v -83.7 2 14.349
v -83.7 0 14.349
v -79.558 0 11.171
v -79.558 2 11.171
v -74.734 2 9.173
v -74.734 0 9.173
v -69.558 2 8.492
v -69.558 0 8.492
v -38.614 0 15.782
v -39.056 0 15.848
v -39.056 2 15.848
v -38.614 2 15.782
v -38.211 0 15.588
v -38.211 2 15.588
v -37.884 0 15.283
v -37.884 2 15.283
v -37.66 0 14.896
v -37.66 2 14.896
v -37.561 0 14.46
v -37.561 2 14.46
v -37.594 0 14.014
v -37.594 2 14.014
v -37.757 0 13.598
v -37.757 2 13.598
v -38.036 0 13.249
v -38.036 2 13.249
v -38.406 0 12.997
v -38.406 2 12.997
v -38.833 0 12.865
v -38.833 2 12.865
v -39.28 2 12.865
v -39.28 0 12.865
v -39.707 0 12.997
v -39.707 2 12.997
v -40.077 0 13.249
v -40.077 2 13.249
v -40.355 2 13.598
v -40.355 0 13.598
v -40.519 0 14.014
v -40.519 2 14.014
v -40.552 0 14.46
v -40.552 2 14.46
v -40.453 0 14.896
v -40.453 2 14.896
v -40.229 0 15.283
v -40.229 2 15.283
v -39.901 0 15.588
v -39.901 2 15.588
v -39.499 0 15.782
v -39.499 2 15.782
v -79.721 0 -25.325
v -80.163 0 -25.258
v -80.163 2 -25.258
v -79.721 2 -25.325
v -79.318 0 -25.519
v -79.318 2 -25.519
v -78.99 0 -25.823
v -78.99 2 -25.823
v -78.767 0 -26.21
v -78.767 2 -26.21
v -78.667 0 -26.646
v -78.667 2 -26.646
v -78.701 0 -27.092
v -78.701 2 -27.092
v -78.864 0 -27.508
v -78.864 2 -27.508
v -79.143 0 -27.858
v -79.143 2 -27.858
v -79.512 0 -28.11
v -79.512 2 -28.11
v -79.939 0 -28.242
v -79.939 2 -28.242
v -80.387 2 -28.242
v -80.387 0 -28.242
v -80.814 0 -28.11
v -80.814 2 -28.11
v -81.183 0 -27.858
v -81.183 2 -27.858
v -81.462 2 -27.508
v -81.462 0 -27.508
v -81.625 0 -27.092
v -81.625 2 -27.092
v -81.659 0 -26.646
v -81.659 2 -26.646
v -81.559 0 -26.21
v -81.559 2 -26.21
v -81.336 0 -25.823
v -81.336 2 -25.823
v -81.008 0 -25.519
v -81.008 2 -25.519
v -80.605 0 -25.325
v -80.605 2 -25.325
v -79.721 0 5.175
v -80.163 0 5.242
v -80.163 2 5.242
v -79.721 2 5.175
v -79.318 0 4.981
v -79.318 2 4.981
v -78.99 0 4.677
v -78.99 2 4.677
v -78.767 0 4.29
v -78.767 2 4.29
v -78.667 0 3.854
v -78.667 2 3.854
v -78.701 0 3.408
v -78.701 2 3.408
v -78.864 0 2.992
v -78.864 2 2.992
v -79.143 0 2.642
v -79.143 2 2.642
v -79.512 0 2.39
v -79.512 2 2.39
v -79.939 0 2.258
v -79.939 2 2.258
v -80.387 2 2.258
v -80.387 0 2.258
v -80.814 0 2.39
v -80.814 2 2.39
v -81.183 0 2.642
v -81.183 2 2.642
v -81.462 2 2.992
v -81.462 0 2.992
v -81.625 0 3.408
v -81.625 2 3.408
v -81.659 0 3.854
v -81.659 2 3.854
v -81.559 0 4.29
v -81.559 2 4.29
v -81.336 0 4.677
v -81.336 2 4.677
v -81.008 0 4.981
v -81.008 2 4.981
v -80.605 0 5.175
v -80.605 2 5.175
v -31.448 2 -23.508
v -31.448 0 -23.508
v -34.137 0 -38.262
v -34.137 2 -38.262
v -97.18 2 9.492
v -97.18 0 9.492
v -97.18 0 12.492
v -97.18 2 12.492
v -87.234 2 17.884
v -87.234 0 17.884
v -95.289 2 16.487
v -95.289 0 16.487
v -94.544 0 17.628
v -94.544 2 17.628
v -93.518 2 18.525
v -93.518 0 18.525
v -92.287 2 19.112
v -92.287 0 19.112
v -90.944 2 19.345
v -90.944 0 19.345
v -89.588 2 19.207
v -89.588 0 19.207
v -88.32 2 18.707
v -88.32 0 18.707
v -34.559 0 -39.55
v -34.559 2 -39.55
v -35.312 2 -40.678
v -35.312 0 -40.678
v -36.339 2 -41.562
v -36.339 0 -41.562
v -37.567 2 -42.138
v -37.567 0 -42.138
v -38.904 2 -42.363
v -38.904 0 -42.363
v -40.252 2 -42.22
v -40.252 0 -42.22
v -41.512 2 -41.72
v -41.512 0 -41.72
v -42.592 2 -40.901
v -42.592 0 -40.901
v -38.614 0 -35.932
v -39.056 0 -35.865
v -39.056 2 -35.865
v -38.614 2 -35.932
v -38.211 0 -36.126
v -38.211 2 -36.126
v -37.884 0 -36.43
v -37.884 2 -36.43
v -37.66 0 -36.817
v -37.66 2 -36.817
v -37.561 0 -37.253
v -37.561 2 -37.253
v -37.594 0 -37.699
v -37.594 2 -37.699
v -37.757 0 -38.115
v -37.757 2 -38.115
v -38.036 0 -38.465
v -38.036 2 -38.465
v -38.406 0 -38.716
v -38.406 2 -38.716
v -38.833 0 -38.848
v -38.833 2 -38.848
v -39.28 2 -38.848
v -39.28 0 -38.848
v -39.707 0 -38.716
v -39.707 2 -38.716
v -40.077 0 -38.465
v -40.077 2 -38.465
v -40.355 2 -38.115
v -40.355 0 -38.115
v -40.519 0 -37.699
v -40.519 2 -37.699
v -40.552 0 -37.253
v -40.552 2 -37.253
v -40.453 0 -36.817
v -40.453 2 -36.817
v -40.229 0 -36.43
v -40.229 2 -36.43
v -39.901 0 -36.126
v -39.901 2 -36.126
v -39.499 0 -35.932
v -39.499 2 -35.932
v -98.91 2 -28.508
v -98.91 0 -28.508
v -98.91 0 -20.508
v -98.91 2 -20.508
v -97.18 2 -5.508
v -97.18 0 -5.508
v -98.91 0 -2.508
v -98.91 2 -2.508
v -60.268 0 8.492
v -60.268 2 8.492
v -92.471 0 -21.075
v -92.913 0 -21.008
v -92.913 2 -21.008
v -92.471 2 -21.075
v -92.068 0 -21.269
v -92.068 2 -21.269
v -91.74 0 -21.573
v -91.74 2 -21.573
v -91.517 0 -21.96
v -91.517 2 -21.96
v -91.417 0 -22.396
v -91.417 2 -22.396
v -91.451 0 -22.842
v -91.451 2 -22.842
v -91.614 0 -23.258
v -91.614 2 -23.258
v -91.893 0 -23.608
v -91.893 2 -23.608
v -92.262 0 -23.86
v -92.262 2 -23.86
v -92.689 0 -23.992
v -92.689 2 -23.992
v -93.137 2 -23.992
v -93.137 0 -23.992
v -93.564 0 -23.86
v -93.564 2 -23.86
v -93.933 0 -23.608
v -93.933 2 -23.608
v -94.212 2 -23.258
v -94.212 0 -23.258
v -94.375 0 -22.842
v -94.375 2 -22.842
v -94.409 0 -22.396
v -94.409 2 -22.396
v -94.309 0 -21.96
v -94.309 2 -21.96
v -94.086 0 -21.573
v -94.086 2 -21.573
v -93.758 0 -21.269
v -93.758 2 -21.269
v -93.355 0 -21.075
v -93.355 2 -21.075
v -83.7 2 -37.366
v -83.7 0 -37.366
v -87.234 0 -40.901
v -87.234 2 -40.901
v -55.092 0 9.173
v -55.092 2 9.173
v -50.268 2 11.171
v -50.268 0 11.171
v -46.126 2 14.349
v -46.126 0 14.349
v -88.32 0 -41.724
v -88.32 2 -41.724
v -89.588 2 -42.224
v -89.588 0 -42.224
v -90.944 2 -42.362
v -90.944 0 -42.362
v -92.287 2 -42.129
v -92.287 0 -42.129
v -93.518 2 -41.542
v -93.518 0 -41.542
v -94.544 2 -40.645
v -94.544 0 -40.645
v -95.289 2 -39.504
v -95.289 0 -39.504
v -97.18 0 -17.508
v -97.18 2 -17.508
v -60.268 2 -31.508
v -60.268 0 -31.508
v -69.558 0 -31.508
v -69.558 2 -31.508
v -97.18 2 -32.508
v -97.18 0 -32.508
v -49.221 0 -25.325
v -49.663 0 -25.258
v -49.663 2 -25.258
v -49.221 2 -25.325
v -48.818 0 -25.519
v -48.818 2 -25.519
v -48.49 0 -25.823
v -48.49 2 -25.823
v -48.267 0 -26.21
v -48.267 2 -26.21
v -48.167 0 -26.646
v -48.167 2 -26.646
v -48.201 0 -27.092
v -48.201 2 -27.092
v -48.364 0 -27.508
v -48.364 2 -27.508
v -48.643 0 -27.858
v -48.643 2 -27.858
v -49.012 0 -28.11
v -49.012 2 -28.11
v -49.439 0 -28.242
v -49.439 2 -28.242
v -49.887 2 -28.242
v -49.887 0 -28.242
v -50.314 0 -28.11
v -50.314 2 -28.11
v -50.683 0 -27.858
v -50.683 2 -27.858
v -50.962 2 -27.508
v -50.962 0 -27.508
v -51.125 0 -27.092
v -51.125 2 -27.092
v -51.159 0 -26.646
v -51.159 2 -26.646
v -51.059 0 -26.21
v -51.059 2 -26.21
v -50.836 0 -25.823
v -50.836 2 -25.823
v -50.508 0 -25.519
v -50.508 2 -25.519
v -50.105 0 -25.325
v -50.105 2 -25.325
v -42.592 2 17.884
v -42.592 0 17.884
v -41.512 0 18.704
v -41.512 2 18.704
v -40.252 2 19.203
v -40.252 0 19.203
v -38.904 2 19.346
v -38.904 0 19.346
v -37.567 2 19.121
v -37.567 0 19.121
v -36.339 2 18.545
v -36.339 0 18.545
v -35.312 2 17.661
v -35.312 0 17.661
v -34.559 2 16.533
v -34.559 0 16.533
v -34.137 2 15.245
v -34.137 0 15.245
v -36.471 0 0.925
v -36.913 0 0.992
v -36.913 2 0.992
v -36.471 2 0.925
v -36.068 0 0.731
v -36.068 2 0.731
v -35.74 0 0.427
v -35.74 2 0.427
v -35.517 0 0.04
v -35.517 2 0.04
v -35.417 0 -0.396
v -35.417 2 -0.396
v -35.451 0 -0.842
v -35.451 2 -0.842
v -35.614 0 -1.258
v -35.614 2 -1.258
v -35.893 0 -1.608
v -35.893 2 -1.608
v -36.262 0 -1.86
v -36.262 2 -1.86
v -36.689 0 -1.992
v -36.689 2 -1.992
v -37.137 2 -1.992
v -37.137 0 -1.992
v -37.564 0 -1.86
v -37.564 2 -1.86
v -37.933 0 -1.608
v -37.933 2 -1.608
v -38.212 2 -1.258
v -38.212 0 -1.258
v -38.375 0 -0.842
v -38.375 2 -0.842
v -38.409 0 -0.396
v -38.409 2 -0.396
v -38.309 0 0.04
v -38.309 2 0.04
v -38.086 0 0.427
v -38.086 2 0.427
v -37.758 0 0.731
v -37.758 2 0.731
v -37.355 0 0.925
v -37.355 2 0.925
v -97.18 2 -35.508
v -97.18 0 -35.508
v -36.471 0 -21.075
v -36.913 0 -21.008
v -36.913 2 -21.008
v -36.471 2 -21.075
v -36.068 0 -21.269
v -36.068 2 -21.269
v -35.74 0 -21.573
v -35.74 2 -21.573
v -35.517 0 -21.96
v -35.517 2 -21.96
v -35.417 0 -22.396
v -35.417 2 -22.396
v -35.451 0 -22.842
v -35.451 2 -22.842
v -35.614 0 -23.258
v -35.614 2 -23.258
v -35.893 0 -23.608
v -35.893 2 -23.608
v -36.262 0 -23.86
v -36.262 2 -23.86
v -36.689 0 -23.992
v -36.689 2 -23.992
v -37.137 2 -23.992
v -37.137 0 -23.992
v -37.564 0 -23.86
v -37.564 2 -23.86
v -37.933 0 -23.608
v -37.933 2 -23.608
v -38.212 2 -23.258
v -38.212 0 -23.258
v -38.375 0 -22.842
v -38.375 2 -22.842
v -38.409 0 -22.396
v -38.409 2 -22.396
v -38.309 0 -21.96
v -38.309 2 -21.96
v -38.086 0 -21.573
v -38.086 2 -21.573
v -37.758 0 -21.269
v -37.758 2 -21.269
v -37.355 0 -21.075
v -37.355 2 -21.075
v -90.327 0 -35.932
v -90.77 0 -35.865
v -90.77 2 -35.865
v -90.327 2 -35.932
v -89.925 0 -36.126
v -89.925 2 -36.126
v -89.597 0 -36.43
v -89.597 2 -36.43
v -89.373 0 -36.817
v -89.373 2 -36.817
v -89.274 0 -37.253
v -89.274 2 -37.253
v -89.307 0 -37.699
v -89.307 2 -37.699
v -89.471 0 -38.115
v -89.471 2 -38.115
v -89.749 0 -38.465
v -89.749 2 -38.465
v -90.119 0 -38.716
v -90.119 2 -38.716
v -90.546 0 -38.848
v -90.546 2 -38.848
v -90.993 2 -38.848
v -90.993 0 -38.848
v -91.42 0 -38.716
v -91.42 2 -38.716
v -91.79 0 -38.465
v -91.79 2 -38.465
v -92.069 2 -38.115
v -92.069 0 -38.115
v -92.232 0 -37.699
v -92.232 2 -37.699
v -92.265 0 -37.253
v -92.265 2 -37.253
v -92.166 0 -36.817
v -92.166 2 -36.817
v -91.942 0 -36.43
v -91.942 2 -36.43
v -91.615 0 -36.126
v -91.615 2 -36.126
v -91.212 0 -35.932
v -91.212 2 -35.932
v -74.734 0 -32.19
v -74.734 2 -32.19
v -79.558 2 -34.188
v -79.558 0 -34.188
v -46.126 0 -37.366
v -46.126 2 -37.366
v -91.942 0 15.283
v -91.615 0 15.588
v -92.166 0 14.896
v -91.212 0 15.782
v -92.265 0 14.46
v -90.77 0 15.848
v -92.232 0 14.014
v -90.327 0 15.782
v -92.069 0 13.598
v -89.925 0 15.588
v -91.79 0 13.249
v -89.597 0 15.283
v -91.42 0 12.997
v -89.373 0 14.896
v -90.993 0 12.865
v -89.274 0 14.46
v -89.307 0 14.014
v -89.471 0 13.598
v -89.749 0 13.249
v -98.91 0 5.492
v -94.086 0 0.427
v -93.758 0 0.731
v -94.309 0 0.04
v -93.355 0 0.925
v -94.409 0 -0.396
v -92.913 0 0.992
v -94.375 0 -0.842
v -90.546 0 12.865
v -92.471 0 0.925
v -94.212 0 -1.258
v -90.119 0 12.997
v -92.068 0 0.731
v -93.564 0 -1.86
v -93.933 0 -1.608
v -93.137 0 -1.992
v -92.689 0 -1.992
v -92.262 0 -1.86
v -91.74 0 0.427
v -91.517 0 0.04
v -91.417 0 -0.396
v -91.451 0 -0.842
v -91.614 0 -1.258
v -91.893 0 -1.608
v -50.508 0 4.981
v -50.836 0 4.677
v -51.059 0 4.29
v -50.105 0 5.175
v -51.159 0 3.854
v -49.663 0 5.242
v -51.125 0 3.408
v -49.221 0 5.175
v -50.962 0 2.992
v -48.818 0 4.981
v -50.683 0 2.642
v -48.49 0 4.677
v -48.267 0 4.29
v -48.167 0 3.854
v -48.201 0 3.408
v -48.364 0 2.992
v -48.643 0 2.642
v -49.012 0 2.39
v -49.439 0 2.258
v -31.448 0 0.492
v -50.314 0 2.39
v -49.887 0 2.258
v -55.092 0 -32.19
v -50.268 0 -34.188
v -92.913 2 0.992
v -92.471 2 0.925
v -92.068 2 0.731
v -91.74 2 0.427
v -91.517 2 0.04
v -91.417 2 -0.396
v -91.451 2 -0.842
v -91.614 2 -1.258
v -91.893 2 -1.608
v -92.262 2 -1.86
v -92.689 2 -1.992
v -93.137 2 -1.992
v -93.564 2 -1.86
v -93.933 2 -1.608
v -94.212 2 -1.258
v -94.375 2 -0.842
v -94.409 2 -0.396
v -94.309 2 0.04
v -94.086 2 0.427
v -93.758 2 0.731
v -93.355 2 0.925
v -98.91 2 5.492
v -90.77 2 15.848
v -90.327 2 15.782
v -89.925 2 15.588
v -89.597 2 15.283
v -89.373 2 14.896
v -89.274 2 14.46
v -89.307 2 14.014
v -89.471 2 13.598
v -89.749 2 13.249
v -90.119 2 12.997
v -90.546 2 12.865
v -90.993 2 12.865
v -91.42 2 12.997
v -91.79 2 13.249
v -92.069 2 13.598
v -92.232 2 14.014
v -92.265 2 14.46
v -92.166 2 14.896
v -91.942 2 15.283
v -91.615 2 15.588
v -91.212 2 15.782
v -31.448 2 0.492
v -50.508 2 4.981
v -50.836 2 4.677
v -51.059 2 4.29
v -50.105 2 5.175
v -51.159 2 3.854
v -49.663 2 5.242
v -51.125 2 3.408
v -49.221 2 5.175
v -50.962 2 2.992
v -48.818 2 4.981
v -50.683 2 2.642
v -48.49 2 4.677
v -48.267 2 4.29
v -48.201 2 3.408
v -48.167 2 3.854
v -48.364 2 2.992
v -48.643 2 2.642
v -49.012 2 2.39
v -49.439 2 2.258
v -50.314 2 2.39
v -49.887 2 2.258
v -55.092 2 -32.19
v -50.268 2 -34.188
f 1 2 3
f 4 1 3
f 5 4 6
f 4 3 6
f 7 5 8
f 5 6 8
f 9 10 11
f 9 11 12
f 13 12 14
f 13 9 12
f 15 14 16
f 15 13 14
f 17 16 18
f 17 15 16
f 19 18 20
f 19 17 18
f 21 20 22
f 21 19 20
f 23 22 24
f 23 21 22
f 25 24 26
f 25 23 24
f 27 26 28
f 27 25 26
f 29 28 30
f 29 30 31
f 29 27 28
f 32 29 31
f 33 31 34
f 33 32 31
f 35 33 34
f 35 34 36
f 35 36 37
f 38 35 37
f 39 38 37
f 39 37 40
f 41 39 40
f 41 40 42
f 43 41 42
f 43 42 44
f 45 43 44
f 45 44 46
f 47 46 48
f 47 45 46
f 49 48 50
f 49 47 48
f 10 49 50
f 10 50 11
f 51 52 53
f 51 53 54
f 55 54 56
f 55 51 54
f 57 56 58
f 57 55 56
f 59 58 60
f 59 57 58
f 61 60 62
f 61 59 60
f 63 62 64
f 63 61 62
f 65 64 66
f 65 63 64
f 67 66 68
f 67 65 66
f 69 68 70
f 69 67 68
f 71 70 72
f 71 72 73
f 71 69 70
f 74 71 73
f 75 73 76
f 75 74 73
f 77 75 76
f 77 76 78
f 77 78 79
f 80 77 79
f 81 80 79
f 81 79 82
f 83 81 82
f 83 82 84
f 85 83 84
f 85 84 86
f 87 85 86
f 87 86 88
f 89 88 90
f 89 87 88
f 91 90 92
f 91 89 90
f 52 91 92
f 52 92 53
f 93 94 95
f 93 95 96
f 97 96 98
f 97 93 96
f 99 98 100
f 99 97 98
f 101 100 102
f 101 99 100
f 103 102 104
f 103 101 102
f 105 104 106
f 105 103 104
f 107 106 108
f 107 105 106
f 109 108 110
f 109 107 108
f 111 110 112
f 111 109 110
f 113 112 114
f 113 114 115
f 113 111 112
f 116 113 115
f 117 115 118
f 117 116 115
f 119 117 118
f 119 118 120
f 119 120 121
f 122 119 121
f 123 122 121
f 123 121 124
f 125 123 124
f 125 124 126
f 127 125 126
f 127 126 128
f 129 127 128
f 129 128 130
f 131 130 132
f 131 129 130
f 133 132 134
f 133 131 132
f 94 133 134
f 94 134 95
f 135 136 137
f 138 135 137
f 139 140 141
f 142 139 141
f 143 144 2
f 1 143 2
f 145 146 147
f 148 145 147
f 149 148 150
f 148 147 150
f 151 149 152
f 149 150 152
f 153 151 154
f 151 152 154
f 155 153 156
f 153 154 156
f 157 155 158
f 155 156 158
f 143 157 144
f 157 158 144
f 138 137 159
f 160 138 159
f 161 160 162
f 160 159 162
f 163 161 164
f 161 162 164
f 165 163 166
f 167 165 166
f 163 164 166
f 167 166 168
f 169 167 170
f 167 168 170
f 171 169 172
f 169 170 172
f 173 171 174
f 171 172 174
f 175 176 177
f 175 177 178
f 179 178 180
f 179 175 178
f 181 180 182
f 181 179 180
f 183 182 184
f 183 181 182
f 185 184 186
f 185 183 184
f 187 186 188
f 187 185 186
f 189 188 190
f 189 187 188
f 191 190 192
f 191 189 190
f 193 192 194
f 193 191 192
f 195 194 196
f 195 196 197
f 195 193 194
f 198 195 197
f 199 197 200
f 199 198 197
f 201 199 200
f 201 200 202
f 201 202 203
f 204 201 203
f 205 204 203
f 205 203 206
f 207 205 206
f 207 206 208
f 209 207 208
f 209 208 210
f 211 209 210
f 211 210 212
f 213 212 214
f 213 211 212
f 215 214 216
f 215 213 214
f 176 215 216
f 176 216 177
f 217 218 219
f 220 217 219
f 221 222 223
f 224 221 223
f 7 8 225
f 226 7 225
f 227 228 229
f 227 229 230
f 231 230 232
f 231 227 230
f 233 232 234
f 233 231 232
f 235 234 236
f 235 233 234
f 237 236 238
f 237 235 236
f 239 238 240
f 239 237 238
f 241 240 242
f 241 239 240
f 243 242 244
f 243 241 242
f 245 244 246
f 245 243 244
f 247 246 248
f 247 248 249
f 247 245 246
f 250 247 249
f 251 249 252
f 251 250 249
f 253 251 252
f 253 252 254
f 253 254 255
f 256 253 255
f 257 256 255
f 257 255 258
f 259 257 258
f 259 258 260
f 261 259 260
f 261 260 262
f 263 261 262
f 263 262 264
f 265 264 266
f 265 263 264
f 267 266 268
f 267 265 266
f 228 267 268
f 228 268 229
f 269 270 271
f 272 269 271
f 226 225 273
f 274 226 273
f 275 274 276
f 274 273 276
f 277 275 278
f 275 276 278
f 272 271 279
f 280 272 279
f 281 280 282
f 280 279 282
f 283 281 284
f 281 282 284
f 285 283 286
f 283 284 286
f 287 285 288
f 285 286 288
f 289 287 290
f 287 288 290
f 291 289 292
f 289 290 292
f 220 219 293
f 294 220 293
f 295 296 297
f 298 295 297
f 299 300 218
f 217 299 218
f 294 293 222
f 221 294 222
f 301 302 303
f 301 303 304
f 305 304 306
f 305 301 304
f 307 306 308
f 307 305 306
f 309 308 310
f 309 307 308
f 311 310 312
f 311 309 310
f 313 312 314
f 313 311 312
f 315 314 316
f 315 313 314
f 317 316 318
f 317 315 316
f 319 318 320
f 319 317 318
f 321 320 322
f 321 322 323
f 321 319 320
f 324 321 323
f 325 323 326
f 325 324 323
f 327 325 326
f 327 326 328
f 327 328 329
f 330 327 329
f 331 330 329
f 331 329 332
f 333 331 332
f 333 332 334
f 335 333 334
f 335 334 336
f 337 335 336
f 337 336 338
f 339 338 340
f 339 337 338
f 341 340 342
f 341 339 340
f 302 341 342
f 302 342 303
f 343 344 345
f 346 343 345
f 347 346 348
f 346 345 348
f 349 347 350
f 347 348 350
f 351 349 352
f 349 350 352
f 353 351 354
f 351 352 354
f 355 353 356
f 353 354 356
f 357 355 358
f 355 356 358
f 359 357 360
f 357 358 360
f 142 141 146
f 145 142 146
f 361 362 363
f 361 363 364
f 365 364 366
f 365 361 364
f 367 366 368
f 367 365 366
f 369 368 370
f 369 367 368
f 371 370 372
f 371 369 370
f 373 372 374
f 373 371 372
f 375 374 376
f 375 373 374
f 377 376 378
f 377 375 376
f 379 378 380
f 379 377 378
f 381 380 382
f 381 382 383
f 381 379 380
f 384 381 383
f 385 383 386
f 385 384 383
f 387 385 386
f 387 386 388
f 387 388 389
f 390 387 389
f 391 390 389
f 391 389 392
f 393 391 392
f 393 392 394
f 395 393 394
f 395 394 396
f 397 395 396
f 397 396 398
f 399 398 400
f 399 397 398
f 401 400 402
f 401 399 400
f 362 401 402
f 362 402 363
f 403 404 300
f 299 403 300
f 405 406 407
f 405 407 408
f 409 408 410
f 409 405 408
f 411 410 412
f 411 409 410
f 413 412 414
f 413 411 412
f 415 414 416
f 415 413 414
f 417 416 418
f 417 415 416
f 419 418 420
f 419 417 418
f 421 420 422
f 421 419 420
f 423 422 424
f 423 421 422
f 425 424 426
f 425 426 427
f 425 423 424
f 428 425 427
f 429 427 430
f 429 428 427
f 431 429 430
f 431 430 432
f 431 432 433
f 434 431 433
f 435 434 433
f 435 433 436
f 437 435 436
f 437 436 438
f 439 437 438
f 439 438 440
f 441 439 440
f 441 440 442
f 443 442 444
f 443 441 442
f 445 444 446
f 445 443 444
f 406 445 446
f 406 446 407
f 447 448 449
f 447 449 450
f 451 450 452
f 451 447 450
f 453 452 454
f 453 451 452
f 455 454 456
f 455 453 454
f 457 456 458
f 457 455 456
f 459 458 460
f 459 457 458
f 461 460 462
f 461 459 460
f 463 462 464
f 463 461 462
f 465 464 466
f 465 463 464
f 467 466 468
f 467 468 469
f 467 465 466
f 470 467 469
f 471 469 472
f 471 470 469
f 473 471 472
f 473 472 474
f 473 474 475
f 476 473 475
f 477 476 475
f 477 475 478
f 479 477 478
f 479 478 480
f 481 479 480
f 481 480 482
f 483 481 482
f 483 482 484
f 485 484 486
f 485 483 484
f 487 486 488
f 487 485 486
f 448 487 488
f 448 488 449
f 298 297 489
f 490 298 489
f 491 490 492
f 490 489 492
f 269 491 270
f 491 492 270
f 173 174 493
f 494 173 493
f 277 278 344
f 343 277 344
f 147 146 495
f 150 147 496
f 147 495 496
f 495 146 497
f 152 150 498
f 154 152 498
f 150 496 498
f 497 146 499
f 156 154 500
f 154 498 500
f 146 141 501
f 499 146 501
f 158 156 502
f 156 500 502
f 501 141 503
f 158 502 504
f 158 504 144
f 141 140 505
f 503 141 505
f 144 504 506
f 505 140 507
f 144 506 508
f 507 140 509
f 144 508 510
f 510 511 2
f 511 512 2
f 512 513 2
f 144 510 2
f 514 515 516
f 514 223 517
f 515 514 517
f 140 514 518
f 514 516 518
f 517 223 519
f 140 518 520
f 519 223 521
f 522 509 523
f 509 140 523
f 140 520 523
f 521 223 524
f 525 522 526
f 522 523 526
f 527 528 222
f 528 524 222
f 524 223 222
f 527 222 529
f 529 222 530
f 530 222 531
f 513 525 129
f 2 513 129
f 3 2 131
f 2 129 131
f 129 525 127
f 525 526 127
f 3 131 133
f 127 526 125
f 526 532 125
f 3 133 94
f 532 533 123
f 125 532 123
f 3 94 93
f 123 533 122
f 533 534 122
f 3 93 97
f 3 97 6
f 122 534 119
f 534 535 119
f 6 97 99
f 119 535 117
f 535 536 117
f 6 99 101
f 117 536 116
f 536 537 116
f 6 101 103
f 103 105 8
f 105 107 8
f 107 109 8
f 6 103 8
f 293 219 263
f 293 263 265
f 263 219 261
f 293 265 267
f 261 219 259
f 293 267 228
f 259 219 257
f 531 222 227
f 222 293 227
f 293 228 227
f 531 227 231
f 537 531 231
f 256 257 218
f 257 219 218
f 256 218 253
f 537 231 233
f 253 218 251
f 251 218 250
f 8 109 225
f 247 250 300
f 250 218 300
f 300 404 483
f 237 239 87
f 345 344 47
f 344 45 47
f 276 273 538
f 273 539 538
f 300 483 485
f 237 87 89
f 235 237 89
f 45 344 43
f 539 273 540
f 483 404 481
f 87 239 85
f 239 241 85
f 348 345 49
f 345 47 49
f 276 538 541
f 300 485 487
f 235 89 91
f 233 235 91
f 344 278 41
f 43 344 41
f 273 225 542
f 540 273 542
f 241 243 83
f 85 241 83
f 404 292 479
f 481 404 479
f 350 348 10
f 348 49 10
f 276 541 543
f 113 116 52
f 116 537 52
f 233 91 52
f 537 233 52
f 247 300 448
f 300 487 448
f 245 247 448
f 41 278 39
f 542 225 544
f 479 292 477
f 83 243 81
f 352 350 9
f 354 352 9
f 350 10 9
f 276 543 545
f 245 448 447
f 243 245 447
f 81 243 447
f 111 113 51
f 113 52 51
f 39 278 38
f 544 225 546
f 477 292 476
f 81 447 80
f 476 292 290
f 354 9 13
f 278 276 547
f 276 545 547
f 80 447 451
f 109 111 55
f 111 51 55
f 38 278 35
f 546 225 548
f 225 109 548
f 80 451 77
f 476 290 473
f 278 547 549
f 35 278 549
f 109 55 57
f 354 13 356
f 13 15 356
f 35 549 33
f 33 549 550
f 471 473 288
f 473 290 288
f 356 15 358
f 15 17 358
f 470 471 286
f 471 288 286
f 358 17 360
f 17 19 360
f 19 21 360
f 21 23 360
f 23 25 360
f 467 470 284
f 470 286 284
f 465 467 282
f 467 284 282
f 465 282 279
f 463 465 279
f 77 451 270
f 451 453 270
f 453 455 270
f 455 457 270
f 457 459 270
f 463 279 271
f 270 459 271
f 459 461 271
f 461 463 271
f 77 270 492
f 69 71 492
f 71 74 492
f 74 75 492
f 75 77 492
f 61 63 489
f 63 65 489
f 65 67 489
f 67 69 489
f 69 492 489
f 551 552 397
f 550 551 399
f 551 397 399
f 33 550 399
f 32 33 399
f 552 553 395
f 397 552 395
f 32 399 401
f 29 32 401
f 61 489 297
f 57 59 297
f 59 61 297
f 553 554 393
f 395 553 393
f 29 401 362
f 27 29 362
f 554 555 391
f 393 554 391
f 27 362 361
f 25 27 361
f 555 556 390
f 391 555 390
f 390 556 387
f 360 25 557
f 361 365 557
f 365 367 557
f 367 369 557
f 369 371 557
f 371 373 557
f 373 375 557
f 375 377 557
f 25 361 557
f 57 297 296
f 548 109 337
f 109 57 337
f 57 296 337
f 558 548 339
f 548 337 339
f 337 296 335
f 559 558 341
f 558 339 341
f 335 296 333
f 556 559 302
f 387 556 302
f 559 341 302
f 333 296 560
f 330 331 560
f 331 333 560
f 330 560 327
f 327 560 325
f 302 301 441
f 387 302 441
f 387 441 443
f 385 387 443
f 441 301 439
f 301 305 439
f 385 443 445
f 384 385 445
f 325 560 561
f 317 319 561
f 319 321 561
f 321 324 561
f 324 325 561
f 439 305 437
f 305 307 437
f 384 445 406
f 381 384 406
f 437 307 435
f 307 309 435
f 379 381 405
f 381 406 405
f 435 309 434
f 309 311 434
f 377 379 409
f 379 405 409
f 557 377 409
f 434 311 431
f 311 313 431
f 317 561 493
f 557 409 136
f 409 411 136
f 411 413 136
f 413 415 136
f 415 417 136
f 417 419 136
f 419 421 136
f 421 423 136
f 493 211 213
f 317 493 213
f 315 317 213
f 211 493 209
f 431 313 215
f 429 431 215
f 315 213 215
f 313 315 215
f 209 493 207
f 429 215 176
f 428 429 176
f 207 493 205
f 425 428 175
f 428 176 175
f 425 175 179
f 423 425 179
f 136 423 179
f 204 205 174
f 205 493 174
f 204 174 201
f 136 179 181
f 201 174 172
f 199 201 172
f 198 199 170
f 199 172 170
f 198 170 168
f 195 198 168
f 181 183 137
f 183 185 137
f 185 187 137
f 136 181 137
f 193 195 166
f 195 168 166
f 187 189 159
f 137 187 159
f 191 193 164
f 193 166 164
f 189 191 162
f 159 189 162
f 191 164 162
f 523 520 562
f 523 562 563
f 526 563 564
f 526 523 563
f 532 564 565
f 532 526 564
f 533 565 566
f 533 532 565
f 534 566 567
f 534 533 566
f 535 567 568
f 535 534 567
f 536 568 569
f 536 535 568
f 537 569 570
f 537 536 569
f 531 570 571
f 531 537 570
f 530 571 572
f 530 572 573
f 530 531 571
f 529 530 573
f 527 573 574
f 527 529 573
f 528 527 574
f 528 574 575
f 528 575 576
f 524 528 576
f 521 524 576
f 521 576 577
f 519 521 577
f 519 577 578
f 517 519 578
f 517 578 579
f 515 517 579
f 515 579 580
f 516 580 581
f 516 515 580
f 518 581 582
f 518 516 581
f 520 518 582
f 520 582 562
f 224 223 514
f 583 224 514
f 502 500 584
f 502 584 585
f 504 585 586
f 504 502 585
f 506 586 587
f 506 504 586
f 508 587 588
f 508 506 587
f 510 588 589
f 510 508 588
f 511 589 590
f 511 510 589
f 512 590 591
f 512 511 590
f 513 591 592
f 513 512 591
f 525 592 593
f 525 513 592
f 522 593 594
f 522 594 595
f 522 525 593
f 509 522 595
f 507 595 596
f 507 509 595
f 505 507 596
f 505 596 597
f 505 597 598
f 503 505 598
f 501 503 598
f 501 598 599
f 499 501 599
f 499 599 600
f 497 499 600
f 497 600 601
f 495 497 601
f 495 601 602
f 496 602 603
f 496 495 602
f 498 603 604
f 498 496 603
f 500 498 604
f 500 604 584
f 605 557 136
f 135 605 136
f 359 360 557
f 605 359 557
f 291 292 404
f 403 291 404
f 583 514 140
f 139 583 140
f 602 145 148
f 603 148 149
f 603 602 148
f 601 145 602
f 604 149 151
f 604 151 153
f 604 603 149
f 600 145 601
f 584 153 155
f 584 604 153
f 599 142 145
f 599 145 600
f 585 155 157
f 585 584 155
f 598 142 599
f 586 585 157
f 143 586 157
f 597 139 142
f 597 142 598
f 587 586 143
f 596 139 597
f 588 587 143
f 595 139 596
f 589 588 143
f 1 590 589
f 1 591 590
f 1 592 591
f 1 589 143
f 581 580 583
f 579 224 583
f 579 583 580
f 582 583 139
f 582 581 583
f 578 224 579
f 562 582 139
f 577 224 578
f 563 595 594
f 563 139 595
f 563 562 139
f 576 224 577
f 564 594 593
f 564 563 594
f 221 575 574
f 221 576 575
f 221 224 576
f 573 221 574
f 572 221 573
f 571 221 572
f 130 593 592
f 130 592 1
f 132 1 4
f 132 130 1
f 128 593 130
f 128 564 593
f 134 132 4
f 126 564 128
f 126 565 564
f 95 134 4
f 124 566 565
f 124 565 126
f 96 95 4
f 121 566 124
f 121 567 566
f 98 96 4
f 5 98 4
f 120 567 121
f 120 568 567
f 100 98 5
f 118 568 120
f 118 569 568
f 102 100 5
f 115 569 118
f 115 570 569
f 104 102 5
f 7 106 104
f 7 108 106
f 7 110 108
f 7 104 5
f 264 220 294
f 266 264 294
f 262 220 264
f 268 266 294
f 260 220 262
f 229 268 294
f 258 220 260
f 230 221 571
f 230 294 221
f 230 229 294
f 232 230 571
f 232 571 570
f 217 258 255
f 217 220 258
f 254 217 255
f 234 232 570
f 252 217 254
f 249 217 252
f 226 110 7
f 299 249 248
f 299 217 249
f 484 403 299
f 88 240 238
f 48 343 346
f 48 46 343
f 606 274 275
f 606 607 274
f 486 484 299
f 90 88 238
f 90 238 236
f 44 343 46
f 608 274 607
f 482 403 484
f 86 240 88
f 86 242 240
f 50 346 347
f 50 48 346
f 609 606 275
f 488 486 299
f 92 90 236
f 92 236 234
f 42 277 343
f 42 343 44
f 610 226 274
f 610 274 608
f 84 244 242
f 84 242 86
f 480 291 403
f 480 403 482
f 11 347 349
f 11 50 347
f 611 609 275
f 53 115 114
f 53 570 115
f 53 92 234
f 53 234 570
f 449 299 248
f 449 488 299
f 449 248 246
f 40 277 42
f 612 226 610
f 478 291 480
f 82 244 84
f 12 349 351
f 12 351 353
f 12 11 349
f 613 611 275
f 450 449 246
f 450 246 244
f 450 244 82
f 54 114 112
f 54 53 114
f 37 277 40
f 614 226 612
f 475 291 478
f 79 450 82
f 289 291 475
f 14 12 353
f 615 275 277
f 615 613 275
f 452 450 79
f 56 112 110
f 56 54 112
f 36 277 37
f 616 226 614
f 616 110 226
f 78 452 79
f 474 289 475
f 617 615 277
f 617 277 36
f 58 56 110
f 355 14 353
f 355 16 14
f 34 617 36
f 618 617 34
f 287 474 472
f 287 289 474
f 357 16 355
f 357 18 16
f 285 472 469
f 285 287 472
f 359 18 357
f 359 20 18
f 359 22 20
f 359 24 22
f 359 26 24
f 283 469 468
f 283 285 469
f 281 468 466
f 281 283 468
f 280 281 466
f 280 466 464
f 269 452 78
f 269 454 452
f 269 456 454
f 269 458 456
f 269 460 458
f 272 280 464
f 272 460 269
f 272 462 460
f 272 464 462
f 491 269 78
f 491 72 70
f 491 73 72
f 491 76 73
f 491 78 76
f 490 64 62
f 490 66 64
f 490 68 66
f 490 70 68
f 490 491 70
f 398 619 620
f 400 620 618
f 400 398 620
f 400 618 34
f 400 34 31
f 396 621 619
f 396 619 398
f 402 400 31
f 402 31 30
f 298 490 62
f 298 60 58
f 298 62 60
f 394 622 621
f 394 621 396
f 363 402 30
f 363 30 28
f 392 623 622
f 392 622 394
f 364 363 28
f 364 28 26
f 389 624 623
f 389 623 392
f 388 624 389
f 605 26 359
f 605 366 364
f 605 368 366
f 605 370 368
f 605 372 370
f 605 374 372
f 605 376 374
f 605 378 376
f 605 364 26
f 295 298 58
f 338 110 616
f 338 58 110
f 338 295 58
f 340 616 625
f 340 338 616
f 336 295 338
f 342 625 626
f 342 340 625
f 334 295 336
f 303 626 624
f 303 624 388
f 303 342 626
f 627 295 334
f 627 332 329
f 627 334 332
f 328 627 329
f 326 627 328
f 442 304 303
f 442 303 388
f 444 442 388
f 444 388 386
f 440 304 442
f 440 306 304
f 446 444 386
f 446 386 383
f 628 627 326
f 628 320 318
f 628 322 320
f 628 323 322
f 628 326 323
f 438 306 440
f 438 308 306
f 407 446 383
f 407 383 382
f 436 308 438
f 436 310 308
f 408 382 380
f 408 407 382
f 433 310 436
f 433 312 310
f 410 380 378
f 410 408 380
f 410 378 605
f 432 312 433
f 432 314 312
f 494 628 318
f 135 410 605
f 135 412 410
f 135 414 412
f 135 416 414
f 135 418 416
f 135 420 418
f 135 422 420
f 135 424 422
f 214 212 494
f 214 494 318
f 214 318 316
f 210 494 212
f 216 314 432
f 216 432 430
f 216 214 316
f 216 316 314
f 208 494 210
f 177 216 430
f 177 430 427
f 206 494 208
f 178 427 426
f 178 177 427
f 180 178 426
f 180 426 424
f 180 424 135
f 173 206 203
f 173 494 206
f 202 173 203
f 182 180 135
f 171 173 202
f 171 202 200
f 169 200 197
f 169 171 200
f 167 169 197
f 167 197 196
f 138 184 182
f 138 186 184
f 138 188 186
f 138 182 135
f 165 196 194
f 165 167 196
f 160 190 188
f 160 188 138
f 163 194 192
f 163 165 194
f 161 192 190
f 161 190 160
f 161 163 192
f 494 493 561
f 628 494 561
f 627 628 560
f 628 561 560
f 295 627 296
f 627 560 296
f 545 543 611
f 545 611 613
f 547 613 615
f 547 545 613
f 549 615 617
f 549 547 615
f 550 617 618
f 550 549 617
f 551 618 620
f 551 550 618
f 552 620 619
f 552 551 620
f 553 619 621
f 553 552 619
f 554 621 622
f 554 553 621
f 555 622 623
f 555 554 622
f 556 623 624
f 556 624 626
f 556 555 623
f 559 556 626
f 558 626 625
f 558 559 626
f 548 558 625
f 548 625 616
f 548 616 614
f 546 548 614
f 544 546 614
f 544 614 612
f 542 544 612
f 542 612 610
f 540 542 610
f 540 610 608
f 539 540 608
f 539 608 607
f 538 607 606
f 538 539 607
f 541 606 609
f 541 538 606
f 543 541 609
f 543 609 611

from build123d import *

# Parameters (mm, degrees)
SKETCH1_R           = 1.5
BOSS_EXTRUDE1_DEPTH = 2


with BuildPart() as part:
    # Sketch1 → Boss-Extrude1 (new body)
    # profile 1 of 5: a face of its own
    with BuildSketch(Plane(origin=(0, 0, 0), x_dir=(1, 0, 0), z_dir=(0, 1, 0))):
        with BuildLine():
            Line((-46.126205575, -14.349426059), (-42.591934327, -17.883697307))
            ThreePointArc((-42.591934327, -17.883697307), (-37.566674414, -19.121078278), (-34.137468144, -15.244882561))
            Line((-34.137468144, -15.244882561), (-31.447944327, -0.491561683))
            Line((-31.447944327, -0.491561683), (-31.447944327, 23.508438317))
            Line((-31.447944327, 23.508438317), (-34.137468144, 38.261759196))
            ThreePointArc((-34.137468144, 38.261759196), (-37.566674414, 42.137954912), (-42.591934327, 40.900573941))
            Line((-42.591934327, 40.900573941), (-46.126205575, 37.366302693))
            ThreePointArc((-46.126205575, 37.366302693), (-52.614672551, 33.030847667), (-60.268341199, 31.508438317))
            Line((-60.268341199, 31.508438317), (-69.55766308, 31.508438317))
            ThreePointArc((-69.55766308, 31.508438317), (-77.211331727, 33.030847667), (-83.699798704, 37.366302693))
            Line((-83.699798704, 37.366302693), (-87.234069951, 40.900573941))
            ThreePointArc((-87.234069951, 40.900573941), (-92.450628543, 42.073984291), (-95.744809303, 37.862363639))
            Line((-95.744809303, 37.862363639), (-97.179633644, 23.508438317))
            Line((-97.179633644, 23.508438317), (-97.179633644, -0.491561683))
            Line((-97.179633644, -0.491561683), (-95.744809303, -14.845487005))
            ThreePointArc((-95.744809303, -14.845487005), (-92.450628543, -19.057107657), (-87.234069951, -17.883697307))
            Line((-87.234069951, -17.883697307), (-83.699798704, -14.349426059))
            ThreePointArc((-83.699798704, -14.349426059), (-77.211331727, -10.013971033), (-69.55766308, -8.491561683))
            Line((-69.55766308, -8.491561683), (-60.268341199, -8.491561683))
            ThreePointArc((-60.268341199, -8.491561683), (-52.614672551, -10.013971033), (-46.126205575, -14.349426059))
        make_face()
        with Locations(Location((-39.056400421, -14.348163401, 0), (0, 0, 270))):
            Circle(SKETCH1_R, mode=Mode.SUBTRACT)
        with Locations(Location((-39.056400421, 37.365040035, 0), (0, 0, 270))):
            Circle(SKETCH1_R, mode=Mode.SUBTRACT)
        with Locations(Location((-90.769603857, -14.348163401, 0), (0, 0, 270))):
            Circle(SKETCH1_R, mode=Mode.SUBTRACT)
        with Locations(Location((-49.663002139, -3.741561683, 0), (0, 0, 270))):
            Circle(SKETCH1_R, mode=Mode.SUBTRACT)
        with Locations(Location((-80.163002139, -3.741561683, 0), (0, 0, 270))):
            Circle(SKETCH1_R, mode=Mode.SUBTRACT)
        with Locations(Location((-80.163002139, 26.758438317, 0), (0, 0, 270))):
            Circle(SKETCH1_R, mode=Mode.SUBTRACT)
        with Locations(Location((-49.663002139, 26.758438317, 0), (0, 0, 270))):
            Circle(SKETCH1_R, mode=Mode.SUBTRACT)
        with Locations(Location((-36.913002139, 22.508438317, 0), (0, 0, 270))):
            Circle(SKETCH1_R, mode=Mode.SUBTRACT)
        with Locations(Location((-36.913002139, 0.508438317, 0), (0, 0, 270))):
            Circle(SKETCH1_R, mode=Mode.SUBTRACT)
        with Locations(Location((-92.913002139, 0.508438317, 0), (0, 0, 270))):
            Circle(SKETCH1_R, mode=Mode.SUBTRACT)
        with Locations(Location((-92.913002139, 22.508438317, 0), (0, 0, 270))):
            Circle(SKETCH1_R, mode=Mode.SUBTRACT)
        with Locations(Location((-90.769603857, 37.365040035, 0), (0, 0, 270))):
            Circle(SKETCH1_R, mode=Mode.SUBTRACT)
    # profile 2 of 5: a face of its own
    with BuildSketch(Plane(origin=(0, 0, 0), x_dir=(1, 0, 0), z_dir=(0, 1, 0))):
        with BuildLine():
            Line((-95.744809303, -14.845487005), (-97.179633644, -0.491561683))
            Line((-97.179633644, -0.491561683), (-97.179633644, -9.491561683))
            Line((-97.179633644, -9.491561683), (-97.179633644, -12.491561683))
            Line((-97.179633644, -12.491561683), (-95.289163865, -16.486755774))
            ThreePointArc((-95.289163865, -16.486755774), (-95.5873921, -15.685667214), (-95.744809303, -14.845487005))
        make_face()
    # profile 3 of 5: a face of its own
    with BuildSketch(Plane(origin=(0, 0, 0), x_dir=(1, 0, 0), z_dir=(0, 1, 0))):
        with BuildLine():
            Line((-97.179633644, 23.508438317), (-95.744809303, 37.862363639))
            ThreePointArc((-95.744809303, 37.862363639), (-95.5873921, 38.702543848), (-95.289163865, 39.503632408))
            Line((-95.289163865, 39.503632408), (-97.179633644, 35.508438317))
            Line((-97.179633644, 35.508438317), (-97.179633644, 32.508438317))
            Line((-97.179633644, 32.508438317), (-97.179633644, 23.508438317))
        make_face()
    # profile 4 of 5: a face of its own
    with BuildSketch(Plane(origin=(0, 0, 0), x_dir=(1, 0, 0), z_dir=(0, 1, 0))):
        Polygon((-97.179633644, 17.508438317), (-97.179633644, 23.508438317), (-97.179633644, 32.508438317), (-98.909633644, 28.508438317), (-98.909633644, 20.508438317), align=None)
    # profile 5 of 5: a face of its own
    with BuildSketch(Plane(origin=(0, 0, 0), x_dir=(1, 0, 0), z_dir=(0, 1, 0))):
        Polygon((-97.179633644, -0.491561683), (-97.179633644, 5.508438317), (-98.909633644, 2.508438317), (-98.909633644, -5.491561683), (-97.179633644, -9.491561683), align=None)
    extrude(amount=BOSS_EXTRUDE1_DEPTH)


solid = part.part
